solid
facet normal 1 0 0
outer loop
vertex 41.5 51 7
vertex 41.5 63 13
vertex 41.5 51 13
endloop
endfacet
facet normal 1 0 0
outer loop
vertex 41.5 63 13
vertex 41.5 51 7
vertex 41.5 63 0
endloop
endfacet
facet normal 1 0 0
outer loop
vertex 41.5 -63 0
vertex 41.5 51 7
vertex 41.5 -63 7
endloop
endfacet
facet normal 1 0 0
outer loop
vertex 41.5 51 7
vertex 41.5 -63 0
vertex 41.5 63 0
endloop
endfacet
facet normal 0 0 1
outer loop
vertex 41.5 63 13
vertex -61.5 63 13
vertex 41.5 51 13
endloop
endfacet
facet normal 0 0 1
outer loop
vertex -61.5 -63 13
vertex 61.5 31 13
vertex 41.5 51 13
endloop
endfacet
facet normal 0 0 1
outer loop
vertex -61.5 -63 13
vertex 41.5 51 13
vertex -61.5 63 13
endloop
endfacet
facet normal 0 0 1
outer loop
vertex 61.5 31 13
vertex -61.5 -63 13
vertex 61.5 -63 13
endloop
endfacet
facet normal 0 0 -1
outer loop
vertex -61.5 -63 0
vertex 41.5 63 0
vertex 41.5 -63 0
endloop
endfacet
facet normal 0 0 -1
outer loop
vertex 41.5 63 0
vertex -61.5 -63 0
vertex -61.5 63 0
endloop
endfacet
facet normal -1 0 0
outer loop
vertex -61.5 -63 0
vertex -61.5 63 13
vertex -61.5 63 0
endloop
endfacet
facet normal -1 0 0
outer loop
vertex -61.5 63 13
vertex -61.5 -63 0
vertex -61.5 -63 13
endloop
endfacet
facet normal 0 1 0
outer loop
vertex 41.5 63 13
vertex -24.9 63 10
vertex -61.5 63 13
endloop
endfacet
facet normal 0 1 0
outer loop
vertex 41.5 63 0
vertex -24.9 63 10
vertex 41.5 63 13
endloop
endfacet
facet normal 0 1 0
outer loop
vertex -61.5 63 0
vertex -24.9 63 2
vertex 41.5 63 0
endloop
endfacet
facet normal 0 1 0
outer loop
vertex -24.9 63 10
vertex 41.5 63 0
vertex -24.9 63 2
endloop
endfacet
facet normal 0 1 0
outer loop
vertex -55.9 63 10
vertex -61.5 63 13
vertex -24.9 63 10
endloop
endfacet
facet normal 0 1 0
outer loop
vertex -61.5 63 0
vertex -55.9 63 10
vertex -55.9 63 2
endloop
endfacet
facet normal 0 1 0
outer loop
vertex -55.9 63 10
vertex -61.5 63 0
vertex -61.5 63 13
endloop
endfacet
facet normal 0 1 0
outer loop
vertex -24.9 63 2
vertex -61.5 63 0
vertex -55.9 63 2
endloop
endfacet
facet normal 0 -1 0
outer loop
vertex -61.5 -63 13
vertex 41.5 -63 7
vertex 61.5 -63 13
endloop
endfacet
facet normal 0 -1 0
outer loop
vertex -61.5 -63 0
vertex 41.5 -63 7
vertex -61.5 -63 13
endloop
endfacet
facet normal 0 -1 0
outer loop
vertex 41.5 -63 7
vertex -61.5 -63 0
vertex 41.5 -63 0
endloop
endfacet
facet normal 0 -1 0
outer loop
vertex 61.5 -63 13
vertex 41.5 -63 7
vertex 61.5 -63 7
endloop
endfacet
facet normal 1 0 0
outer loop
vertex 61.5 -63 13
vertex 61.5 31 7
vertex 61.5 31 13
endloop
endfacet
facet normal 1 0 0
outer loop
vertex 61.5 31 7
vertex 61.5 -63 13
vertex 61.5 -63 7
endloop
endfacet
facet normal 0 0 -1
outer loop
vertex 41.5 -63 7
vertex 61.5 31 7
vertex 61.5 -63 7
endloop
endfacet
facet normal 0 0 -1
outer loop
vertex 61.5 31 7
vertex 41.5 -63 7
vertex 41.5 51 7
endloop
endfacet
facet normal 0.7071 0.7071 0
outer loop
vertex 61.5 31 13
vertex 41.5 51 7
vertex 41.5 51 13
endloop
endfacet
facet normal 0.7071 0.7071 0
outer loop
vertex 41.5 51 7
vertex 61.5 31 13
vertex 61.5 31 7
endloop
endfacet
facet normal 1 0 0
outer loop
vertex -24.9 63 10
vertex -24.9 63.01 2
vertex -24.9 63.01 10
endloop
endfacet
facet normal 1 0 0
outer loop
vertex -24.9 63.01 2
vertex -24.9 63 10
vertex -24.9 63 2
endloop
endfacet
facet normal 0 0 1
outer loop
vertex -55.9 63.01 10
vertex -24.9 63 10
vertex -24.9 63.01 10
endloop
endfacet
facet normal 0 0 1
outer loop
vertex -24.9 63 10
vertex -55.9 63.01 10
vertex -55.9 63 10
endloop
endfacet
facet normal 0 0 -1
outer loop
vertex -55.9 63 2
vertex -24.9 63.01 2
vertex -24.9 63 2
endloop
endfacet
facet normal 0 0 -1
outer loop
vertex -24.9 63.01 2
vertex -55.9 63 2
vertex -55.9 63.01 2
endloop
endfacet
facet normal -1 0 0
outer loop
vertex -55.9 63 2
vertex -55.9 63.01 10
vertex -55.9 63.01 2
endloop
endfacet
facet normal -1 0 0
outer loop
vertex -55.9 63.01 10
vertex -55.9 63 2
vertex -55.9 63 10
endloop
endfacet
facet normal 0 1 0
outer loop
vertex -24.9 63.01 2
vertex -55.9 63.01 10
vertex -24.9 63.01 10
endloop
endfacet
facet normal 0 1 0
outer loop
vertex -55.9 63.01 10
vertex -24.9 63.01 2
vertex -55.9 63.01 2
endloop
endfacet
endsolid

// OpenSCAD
top_front_x = 123;
top_back_x = 103;
top_y = 126;
left_z = 13;
right_z = 6;
slope_dist = 12;

blf_pos = [-top_front_x / 2, -top_y / 2, 0];


module cdrom() {
    translate(blf_pos) {
        cube([top_back_x, top_y, left_z]);
    }

    translate(blf_pos + [top_back_x, 0, left_z - right_z]) {
        cube([20, top_y - slope_dist - 20, right_z]);
    }

    translate(blf_pos + [top_back_x, top_y - slope_dist - 40, left_z - right_z]) {
        rotate([0, 0, 45])
            cube([20 * sqrt(2), 20 * sqrt(2), right_z]);
    }

    color("black")
        translate(blf_pos + [5.6, top_y, 2])
            cube([31, 0.01, 8]);
}

cdrom();
